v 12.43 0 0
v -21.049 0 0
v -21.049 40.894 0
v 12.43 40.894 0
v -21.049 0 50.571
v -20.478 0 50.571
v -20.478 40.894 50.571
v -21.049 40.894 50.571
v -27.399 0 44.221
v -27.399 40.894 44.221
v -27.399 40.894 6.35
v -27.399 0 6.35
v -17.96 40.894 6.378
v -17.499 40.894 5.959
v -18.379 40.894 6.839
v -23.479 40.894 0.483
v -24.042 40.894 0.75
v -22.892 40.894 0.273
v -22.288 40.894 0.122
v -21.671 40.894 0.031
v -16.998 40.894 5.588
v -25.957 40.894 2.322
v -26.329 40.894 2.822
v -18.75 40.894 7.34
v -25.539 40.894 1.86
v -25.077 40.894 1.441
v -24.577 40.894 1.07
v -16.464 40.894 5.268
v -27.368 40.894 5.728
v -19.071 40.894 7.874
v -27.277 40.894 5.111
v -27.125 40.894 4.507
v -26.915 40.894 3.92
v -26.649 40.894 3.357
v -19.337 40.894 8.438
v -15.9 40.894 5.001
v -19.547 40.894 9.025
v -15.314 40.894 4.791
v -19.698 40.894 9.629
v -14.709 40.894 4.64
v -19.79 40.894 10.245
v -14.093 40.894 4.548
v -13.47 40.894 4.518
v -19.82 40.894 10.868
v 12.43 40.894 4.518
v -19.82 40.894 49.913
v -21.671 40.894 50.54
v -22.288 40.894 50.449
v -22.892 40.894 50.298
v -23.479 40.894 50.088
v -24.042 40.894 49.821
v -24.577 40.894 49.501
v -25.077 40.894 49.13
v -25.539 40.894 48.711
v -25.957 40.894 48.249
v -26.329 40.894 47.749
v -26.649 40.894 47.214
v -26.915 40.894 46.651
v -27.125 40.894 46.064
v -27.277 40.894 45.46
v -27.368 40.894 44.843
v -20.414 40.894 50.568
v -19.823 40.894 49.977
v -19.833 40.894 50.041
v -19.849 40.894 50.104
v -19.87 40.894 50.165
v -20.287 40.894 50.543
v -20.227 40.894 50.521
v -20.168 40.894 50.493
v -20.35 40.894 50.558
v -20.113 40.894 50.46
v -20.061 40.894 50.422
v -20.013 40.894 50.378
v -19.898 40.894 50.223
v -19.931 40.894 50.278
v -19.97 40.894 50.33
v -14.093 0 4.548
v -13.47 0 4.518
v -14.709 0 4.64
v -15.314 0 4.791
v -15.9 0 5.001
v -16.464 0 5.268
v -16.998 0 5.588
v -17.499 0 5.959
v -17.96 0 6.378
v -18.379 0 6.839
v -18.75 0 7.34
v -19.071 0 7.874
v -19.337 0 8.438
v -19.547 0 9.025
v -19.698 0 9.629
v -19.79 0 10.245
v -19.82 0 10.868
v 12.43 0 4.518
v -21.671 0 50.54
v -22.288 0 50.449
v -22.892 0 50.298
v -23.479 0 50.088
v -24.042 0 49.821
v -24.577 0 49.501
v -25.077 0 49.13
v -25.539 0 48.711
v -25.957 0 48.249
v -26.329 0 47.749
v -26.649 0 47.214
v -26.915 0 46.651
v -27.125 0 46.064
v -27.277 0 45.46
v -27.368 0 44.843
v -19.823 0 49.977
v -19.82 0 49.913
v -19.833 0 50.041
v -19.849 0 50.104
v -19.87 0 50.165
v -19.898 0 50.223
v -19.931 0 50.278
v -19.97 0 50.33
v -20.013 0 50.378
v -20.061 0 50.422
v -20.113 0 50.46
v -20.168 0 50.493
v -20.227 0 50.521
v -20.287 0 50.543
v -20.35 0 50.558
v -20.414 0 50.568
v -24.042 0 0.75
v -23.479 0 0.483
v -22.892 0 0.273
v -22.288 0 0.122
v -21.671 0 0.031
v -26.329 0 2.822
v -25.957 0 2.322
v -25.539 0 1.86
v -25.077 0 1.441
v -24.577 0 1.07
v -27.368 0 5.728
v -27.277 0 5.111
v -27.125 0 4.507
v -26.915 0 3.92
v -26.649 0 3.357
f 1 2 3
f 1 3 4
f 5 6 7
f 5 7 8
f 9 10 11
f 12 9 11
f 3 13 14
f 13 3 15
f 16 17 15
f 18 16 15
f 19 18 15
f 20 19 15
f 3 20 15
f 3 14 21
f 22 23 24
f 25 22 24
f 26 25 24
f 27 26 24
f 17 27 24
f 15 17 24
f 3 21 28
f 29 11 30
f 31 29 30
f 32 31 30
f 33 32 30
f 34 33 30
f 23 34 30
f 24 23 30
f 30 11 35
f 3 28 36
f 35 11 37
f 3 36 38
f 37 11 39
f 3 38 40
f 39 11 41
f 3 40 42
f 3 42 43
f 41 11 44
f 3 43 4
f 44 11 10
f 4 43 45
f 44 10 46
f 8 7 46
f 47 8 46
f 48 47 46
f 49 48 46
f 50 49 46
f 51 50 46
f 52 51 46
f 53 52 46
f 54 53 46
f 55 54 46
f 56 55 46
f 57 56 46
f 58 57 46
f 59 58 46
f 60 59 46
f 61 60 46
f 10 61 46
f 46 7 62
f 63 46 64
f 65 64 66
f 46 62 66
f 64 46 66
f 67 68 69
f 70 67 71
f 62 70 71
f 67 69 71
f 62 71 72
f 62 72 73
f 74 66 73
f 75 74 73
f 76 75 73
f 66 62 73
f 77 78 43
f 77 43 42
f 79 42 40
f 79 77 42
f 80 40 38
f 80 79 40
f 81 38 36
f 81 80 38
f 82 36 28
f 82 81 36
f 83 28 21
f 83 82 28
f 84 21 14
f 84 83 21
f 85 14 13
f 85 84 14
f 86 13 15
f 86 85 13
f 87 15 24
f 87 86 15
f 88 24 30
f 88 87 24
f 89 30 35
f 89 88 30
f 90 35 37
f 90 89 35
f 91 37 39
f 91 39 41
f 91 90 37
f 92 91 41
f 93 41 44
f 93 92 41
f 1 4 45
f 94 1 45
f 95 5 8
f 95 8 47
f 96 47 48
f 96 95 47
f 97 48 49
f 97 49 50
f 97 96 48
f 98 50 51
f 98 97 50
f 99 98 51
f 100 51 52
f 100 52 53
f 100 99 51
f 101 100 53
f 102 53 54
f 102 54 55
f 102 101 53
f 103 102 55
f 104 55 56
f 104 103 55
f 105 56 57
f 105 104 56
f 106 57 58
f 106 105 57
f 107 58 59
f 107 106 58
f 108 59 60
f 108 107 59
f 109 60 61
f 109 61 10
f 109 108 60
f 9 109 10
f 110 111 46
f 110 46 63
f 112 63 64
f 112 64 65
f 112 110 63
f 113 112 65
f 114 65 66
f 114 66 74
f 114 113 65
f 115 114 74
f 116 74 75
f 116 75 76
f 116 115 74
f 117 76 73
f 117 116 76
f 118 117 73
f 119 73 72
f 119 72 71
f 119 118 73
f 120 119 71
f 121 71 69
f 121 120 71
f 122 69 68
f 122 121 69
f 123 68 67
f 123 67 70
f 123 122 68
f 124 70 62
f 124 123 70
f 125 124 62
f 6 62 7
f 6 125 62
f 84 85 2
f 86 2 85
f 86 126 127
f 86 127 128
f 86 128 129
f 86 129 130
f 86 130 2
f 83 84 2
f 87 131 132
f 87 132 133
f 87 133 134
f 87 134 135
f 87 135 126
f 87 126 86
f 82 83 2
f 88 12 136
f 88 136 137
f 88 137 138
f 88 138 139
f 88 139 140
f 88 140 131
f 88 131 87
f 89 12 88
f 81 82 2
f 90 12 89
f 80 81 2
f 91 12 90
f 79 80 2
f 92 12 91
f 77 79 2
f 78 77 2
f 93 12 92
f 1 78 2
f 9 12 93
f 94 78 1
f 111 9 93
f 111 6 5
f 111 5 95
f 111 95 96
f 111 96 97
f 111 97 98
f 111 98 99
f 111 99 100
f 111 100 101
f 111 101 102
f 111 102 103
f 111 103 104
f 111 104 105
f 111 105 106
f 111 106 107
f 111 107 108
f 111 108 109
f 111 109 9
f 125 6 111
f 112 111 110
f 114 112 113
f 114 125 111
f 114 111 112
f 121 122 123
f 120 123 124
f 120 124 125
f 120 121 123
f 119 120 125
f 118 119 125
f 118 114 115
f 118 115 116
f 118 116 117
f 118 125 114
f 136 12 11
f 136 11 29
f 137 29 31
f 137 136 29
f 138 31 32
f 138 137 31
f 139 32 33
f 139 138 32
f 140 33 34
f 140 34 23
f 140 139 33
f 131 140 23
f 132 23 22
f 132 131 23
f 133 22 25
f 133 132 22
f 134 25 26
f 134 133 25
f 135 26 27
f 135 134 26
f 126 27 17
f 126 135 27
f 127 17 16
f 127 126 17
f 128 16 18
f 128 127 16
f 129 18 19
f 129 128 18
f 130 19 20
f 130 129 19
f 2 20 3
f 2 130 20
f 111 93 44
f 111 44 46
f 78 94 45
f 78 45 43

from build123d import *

# Parameters (mm, degrees)
F1_DEPTH = 40.894


with BuildPart() as f1:
    # F0 (on Front) → F1 (new body)
    with BuildSketch(Plane.XZ):
        with BuildLine():
            Line((-26.524263, 21.714916), (-19.820329, 19.740981))
            Line((-19.820329, 19.740981), (-19.820329, 49.912829))
            ThreePointArc((-19.820329, 49.912829), (-20.013098, 50.378215), (-20.478483, 50.570983))
            Line((-20.478483, 50.570983), (-21.048689, 50.570983))
            ThreePointArc((-21.048689, 50.570983), (-25.538817, 48.711112), (-27.398689, 44.220983))
            Line((-27.398689, 44.220983), (-27.398689, 6.35))
            ThreePointArc((-27.398689, 6.35), (-25.538817, 1.859872), (-21.048689, 0))
            Line((-21.048689, 0), (0, 0))
            Line((0, 0), (12.430089, 0))
            Line((12.430089, 0), (12.430089, 4.517869))
            Line((12.430089, 4.517869), (0, 4.517869))
            Line((0, 4.517869), (-13.470329, 4.517869))
            ThreePointArc((-13.470329, 4.517869), (-17.960457, 6.377741), (-19.820329, 10.867869))
            Line((-19.820329, 10.867869), (-19.820329, 15.958715))
            Line((-19.820329, 15.958715), (-26.524263, 17.925737))
            Line((-26.524263, 17.925737), (-26.524263, 21.714916))
        make_face()
        Polygon((-19.820329, 15.958715), (-19.820329, 19.740981), (-26.524263, 21.714916), (-26.524263, 17.925737), align=None)
    extrude(amount=-F1_DEPTH)


solid = f1.part
